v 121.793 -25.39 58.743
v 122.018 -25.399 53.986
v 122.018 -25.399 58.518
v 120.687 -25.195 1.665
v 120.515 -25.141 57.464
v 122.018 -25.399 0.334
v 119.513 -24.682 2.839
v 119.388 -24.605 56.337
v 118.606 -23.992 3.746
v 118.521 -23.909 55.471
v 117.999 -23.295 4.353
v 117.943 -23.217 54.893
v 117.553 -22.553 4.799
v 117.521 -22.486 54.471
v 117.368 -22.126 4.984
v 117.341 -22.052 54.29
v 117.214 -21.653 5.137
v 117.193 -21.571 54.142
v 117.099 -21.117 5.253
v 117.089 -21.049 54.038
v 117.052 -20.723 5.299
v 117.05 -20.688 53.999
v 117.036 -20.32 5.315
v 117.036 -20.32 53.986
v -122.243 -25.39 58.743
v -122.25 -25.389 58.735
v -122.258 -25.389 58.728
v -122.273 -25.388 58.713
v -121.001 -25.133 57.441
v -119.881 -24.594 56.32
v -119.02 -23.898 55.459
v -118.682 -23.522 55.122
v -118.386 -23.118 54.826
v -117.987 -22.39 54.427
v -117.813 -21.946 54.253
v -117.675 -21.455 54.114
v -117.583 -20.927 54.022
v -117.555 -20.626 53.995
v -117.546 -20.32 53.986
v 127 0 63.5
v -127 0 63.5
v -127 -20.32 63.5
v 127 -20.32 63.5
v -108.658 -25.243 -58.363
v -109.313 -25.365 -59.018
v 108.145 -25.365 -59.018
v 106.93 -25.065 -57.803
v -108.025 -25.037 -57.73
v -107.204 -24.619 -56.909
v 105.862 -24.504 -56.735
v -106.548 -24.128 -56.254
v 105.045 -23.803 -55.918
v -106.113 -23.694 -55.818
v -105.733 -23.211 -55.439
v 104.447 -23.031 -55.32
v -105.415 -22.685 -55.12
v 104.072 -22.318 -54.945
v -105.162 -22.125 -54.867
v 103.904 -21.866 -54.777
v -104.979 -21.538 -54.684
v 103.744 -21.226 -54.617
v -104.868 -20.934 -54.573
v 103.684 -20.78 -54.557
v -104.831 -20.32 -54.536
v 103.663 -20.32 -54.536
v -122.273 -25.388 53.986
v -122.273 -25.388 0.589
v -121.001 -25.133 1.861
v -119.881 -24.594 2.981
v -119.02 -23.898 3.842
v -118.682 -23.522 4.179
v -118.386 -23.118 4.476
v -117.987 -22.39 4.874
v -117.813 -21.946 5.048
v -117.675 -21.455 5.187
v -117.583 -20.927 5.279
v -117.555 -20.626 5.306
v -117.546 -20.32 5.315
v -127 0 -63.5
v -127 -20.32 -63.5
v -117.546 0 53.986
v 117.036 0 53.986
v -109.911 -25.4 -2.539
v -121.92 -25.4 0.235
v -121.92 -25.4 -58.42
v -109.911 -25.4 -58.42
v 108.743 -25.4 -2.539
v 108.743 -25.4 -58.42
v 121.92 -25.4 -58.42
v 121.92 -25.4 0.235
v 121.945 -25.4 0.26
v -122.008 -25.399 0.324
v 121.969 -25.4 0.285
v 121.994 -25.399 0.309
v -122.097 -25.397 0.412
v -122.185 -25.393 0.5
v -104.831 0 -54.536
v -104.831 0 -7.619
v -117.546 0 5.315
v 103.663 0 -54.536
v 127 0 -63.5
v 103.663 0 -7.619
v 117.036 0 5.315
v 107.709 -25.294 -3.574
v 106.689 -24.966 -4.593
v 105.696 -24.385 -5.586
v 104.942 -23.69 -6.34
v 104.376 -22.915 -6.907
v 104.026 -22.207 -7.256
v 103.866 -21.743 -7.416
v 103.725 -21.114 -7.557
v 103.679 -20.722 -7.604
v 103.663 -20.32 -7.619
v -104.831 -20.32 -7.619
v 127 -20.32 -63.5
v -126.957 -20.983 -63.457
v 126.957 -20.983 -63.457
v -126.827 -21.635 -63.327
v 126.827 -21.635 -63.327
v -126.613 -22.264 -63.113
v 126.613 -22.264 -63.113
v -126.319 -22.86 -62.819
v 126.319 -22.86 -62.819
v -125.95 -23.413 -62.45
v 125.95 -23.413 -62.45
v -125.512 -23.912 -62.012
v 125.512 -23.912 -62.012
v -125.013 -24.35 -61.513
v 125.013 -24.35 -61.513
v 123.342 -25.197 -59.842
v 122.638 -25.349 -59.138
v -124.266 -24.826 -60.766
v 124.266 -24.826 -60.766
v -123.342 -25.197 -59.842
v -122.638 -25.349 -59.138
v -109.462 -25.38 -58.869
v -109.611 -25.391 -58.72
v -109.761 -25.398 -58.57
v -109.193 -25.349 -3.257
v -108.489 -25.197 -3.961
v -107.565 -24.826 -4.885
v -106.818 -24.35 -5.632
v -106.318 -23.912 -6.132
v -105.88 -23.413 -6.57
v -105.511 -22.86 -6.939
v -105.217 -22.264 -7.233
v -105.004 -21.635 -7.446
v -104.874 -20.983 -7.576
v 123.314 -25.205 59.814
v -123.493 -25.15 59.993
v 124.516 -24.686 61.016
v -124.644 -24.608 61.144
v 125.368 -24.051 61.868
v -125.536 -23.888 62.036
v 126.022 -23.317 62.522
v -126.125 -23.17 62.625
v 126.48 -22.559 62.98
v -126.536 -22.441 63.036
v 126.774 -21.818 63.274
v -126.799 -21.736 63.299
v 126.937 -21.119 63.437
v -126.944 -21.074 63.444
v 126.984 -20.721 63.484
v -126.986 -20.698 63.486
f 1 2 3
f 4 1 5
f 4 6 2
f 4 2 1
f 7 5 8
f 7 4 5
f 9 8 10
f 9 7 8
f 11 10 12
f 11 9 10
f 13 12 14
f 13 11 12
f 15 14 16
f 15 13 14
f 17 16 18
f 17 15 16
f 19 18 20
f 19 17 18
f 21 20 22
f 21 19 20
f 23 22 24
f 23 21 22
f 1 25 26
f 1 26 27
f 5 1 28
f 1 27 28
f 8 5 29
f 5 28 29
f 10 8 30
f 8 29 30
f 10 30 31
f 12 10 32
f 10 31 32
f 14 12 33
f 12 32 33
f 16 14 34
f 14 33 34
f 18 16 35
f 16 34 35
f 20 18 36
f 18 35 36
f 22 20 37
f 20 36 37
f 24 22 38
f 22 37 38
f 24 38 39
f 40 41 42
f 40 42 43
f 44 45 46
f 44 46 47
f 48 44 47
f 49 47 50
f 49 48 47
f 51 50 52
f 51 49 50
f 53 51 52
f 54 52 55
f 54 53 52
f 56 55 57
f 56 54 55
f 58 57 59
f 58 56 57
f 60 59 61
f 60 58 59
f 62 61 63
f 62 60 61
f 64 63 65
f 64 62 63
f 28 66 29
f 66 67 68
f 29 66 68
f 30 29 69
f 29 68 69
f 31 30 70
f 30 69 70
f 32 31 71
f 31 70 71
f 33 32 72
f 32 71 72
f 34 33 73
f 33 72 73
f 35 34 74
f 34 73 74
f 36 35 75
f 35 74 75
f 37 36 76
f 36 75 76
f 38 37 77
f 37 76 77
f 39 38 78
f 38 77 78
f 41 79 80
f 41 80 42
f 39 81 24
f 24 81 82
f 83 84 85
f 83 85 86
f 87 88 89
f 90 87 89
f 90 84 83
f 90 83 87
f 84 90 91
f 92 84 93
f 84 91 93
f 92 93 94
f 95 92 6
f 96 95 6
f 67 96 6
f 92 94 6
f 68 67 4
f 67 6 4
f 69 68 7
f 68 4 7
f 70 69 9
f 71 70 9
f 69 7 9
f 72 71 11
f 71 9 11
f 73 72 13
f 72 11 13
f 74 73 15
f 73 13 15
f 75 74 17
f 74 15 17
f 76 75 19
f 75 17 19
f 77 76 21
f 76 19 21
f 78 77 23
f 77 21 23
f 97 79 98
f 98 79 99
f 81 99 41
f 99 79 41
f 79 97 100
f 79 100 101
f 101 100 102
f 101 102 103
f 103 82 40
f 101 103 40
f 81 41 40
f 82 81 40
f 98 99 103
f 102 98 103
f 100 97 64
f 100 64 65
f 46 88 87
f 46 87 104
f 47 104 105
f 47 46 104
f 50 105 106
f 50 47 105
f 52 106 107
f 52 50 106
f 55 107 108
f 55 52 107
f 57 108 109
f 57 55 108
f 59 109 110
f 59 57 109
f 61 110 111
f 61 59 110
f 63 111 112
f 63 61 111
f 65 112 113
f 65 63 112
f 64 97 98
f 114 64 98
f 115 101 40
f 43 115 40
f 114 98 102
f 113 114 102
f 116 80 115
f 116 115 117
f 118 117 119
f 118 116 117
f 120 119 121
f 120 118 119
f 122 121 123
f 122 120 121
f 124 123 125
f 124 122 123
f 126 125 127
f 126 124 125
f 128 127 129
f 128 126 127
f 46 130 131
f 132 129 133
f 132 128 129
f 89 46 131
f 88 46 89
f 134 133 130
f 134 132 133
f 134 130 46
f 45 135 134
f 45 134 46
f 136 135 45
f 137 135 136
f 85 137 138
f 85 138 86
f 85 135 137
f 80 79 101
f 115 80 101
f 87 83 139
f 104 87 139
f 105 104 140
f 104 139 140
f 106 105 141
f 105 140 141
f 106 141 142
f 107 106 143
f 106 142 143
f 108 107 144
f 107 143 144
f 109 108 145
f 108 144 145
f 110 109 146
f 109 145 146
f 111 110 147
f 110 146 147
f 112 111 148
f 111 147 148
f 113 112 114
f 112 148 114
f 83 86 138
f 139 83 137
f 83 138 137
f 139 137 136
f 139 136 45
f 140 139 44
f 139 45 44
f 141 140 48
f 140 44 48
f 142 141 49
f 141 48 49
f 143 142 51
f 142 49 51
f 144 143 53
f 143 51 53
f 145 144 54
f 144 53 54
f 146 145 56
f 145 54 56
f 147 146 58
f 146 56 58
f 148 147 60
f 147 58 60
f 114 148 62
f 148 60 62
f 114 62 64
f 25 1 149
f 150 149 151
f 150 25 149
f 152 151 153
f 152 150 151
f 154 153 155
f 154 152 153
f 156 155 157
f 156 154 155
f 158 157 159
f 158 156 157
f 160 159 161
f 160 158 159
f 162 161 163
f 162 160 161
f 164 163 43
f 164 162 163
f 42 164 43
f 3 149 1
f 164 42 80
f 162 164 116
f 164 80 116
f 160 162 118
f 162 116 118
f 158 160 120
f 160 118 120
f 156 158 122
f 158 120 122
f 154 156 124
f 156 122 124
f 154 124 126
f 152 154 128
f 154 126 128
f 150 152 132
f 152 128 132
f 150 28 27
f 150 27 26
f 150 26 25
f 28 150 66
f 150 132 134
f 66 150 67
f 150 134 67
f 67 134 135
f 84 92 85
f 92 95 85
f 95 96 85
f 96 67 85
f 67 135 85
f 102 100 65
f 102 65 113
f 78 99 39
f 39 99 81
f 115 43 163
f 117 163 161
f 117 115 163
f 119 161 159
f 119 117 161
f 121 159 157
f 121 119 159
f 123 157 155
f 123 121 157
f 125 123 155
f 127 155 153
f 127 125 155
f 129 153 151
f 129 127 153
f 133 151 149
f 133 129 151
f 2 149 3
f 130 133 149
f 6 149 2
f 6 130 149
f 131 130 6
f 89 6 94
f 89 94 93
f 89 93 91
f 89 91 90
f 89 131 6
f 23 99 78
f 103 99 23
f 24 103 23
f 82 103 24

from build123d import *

# Parameters (mm, degrees)
F0_W         = 254
F0_H         = 127
F2_DEPTH     = 25.4
F1_W         = 234.5826178789
F1_H         = 48.6704111099
F1_W_2       = 208.4935232997
F1_H_2       = 46.9165234827
F3_DEPTH     = 50.8
F4_DEPTH     = 102.87
F5_T1_DEPTH  = 279.4
F5_T3_DEPTH  = 152.4
F5_T5_DEPTH  = 46.9165234827
F5_T7_DEPTH  = 208.4935232997
F5_T9_DEPTH  = 48.6704111099
F5_T11_DEPTH = 234.5826178789
F5_T17_DEPTH = 59.6165234827
F5_T21_DEPTH = 221.1935232997
F5_T28_DEPTH = 59.6165234827
F5_T32_DEPTH = 221.1935232997
F5_T39_DEPTH = 221.1935232997
F5_T43_DEPTH = 59.6165234827
F5_T50_DEPTH = 59.6165234827
F5_T54_DEPTH = 221.1935232997
F5_T61_DEPTH = 61.3704111099
F5_T65_DEPTH = 247.2826178789
F5_T72_DEPTH = 61.3704111099
F5_T76_DEPTH = 247.2826178789
F5_T83_DEPTH = 247.2826178789
F5_T87_DEPTH = 61.3704111099
F5_T94_DEPTH = 61.3704111099
F5_T98_DEPTH = 247.2826178789


# Not quite as in the source:
# - a fillet or chamfer that OpenCascade refuses, or shapes differently, is made with other operations: its cross-section is extruded or revolved along the edge and cut away or added


with BuildPart() as f2:
    # F0 (on Front) → F2 (new body)
    with BuildSketch(Plane.XZ):
        Rectangle(F0_W, F0_H)
    extrude(amount=F2_DEPTH)

    # F1 (on face) → F3 (cut)
    with BuildSketch(Plane.XZ):
        with Locations((-0.2548918128, 29.650695622)):
            Rectangle(F1_W, F1_H)
        with Locations((-0.5837492645, -31.0777008999)):
            Rectangle(F1_W_2, F1_H_2)
    extrude(amount=-F3_DEPTH, mode=Mode.SUBTRACT)

    # F1 (on face) → F4 (cut)
    with BuildSketch(Plane.XZ):
        with Locations((-0.2548918128, 29.650695622)):
            Rectangle(F1_W, F1_H)
        with Locations((-0.5837492645, -31.0777008999)):
            Rectangle(F1_W_2, F1_H_2)
    extrude(amount=F4_DEPTH, mode=Mode.SUBTRACT)

    # F5: fillet of radius 5.08 on 12 edges, made by hand

    # F5_s2 → F5_t1 (cut)
    with BuildSketch(Plane.YZ.offset(-139.7)):
        with BuildLine():
            ThreePointArc((-20.32, -63.5), (-23.9121024484, -62.0121024484), (-25.4, -58.42))
            Line((-25.4, -58.42), (-25.4, -63.5))
            Line((-25.4, -63.5), (-20.32, -63.5))
        make_face()
        with BuildLine():
            ThreePointArc((-25.4, 58.42), (-23.9121024484, 62.0121024484), (-20.32, 63.5))
            Line((-20.32, 63.5), (-25.4, 63.5))
            Line((-25.4, 63.5), (-25.4, 58.42))
        make_face()
    extrude(amount=F5_T1_DEPTH, mode=Mode.SUBTRACT)

    # F5_s4 → F5_t3 (cut)
    with BuildSketch(Plane.XY.offset(-76.2)):
        with BuildLine():
            ThreePointArc((-127, -20.32), (-125.5121024484, -23.9121024484), (-121.92, -25.4))
            Line((-121.92, -25.4), (-127, -25.4))
            Line((-127, -25.4), (-127, -20.32))
        make_face()
        with BuildLine():
            ThreePointArc((127, -20.32), (125.5121024484, -23.9121024484), (121.92, -25.4))
            Line((121.92, -25.4), (127, -25.4))
            Line((127, -25.4), (127, -20.32))
        make_face()
    extrude(amount=F5_T3_DEPTH, mode=Mode.SUBTRACT)

    # F5_s6 → F5_t5 (cut)
    with BuildSketch(Plane.XY.offset(-54.5359626412)):
        with BuildLine():
            ThreePointArc((-109.9105109143, -25.4), (-106.3184084659, -23.9121024484), (-104.8305109143, -20.32))
            Line((-104.8305109143, -20.32), (-104.8305109143, -25.4))
            Line((-104.8305109143, -25.4), (-109.9105109143, -25.4))
        make_face()
        with BuildLine():
            ThreePointArc((108.7430123854, -25.4), (105.1509099369, -23.9121024484), (103.6630123854, -20.32))
            Line((103.6630123854, -20.32), (103.6630123854, -25.4))
            Line((103.6630123854, -25.4), (108.7430123854, -25.4))
        make_face()
    extrude(amount=F5_T5_DEPTH, mode=Mode.SUBTRACT)

    # F5_s8 → F5_t7 (cut)
    with BuildSketch(Plane.YZ.offset(-104.8305109143)):
        with BuildLine():
            ThreePointArc((-25.4, -59.6159626412), (-23.9121024484, -56.0238601928), (-20.32, -54.5359626412))
            Line((-20.32, -54.5359626412), (-25.4, -54.5359626412))
            Line((-25.4, -54.5359626412), (-25.4, -59.6159626412))
        make_face()
        with BuildLine():
            ThreePointArc((-25.4, -2.5394391586), (-23.9121024484, -6.131541607), (-20.32, -7.6194391586))
            Line((-20.32, -7.6194391586), (-25.4, -7.6194391586))
            Line((-25.4, -7.6194391586), (-25.4, -2.5394391586))
        make_face()
    extrude(amount=F5_T7_DEPTH, mode=Mode.SUBTRACT)

    # F5_s10 → F5_t9 (cut)
    with BuildSketch(Plane.XY.offset(5.315490067)):
        with BuildLine():
            ThreePointArc((-122.6262007523, -25.4), (-119.0340983038, -23.9121024484), (-117.5462007523, -20.32))
            Line((-117.5462007523, -20.32), (-117.5462007523, -25.4))
            Line((-117.5462007523, -25.4), (-122.6262007523, -25.4))
        make_face()
        with BuildLine():
            ThreePointArc((122.1164171267, -25.4), (118.5243146782, -23.9121024484), (117.0364171267, -20.32))
            Line((117.0364171267, -20.32), (117.0364171267, -25.4))
            Line((117.0364171267, -25.4), (122.1164171267, -25.4))
        make_face()
    extrude(amount=F5_T9_DEPTH, mode=Mode.SUBTRACT)

    # F5_s12 → F5_t11 (cut)
    with BuildSketch(Plane.YZ.offset(-117.5462007523)):
        with BuildLine():
            ThreePointArc((-25.4, 0.235490067), (-23.9121024484, 3.8275925154), (-20.32, 5.315490067))
            Line((-20.32, 5.315490067), (-25.4, 5.315490067))
            Line((-25.4, 5.315490067), (-25.4, 0.235490067))
        make_face()
        with BuildLine():
            ThreePointArc((-25.4, 59.0659011769), (-23.9121024484, 55.4737987285), (-20.32, 53.9859011769))
            Line((-20.32, 53.9859011769), (-25.4, 53.9859011769))
            Line((-25.4, 53.9859011769), (-25.4, 59.0659011769))
        make_face()
    extrude(amount=F5_T11_DEPTH, mode=Mode.SUBTRACT)


with BuildPart() as f5_tool15:
    # F5_s16 → F5_t17 (new body)
    with BuildSketch(Plane.XY.offset(-67.2359626412)):
        with BuildLine():
            ThreePointArc((-109.9105109143, -25.4), (-106.3184084659, -23.9121024484), (-104.8305109143, -20.32))
            Line((-104.8305109143, -20.32), (-104.8305109143, -25.4))
            Line((-104.8305109143, -25.4), (-109.9105109143, -25.4))
        make_face()
    extrude(amount=F5_T17_DEPTH)

    split(bisect_by=Plane.XY.offset(-54.5359626412), keep=Keep.BOTTOM)


with BuildPart() as f5_tool19:
    # F5_s20 → F5_t21 (new body)
    with BuildSketch(Plane.YZ.offset(103.6630123854)):
        with BuildLine():
            ThreePointArc((-25.4, -59.6159626412), (-23.9121024484, -56.0238601928), (-20.32, -54.5359626412))
            Line((-20.32, -54.5359626412), (-25.4, -54.5359626412))
            Line((-25.4, -54.5359626412), (-25.4, -59.6159626412))
        make_face()
    extrude(amount=-F5_T21_DEPTH)

    split(bisect_by=Plane.YZ.offset(-104.8305109143), keep=Keep.BOTTOM)


with BuildPart() as f5_tool15_1:
    add(f5_tool15.part)

    # F5_t23: intersect F5_tool19
    add(f5_tool19.part, mode=Mode.INTERSECT)


with BuildPart() as f2_1:
    add(f2.part)

    # F5_t13: cut F5_tool15
    add(f5_tool15_1.part, mode=Mode.SUBTRACT)


with BuildPart() as f5_tool26:
    # F5_s27 → F5_t28 (new body)
    with BuildSketch(Plane.XY.offset(-54.5359626412)):
        with BuildLine():
            ThreePointArc((-109.9105109143, -25.4), (-106.3184084659, -23.9121024484), (-104.8305109143, -20.32))
            Line((-104.8305109143, -20.32), (-104.8305109143, -25.4))
            Line((-104.8305109143, -25.4), (-109.9105109143, -25.4))
        make_face()
    extrude(amount=F5_T28_DEPTH)

    split(bisect_by=Plane.XY.offset(-7.6194391586), keep=Keep.TOP)


with BuildPart() as f5_tool30:
    # F5_s31 → F5_t32 (new body)
    with BuildSketch(Plane.YZ.offset(-117.5305109143)):
        with BuildLine():
            ThreePointArc((-25.4, -2.5394391586), (-23.9121024484, -6.131541607), (-20.32, -7.6194391586))
            Line((-20.32, -7.6194391586), (-25.4, -7.6194391586))
            Line((-25.4, -7.6194391586), (-25.4, -2.5394391586))
        make_face()
    extrude(amount=F5_T32_DEPTH)

    split(bisect_by=Plane.YZ.offset(-104.8305109143), keep=Keep.BOTTOM)


with BuildPart() as f5_tool26_1:
    add(f5_tool26.part)

    # F5_t34: intersect F5_tool30
    add(f5_tool30.part, mode=Mode.INTERSECT)


with BuildPart() as f2_2:
    add(f2_1.part)

    # F5_t24: cut F5_tool26
    add(f5_tool26_1.part, mode=Mode.SUBTRACT)


with BuildPart() as f5_tool37:
    # F5_s38 → F5_t39 (new body)
    with BuildSketch(Plane.YZ.offset(116.3630123854)):
        with BuildLine():
            ThreePointArc((-25.4, -59.6159626412), (-23.9121024484, -56.0238601928), (-20.32, -54.5359626412))
            Line((-20.32, -54.5359626412), (-25.4, -54.5359626412))
            Line((-25.4, -54.5359626412), (-25.4, -59.6159626412))
        make_face()
    extrude(amount=-F5_T39_DEPTH)

    split(bisect_by=Plane.YZ.offset(103.6630123854), keep=Keep.TOP)


with BuildPart() as f5_tool41:
    # F5_s42 → F5_t43 (new body)
    with BuildSketch(Plane.XY.offset(-7.6194391586)):
        with BuildLine():
            ThreePointArc((108.7430123854, -25.4), (105.1509099369, -23.9121024484), (103.6630123854, -20.32))
            Line((103.6630123854, -20.32), (103.6630123854, -25.4))
            Line((103.6630123854, -25.4), (108.7430123854, -25.4))
        make_face()
    extrude(amount=-F5_T43_DEPTH)

    split(bisect_by=Plane.XY.offset(-54.5359626412), keep=Keep.BOTTOM)


with BuildPart() as f5_tool37_1:
    add(f5_tool37.part)

    # F5_t45: intersect F5_tool41
    add(f5_tool41.part, mode=Mode.INTERSECT)


with BuildPart() as f2_3:
    add(f2_2.part)

    # F5_t35: cut F5_tool37
    add(f5_tool37_1.part, mode=Mode.SUBTRACT)


with BuildPart() as f5_tool48:
    # F5_s49 → F5_t50 (new body)
    with BuildSketch(Plane.XY.offset(5.0805608414)):
        with BuildLine():
            ThreePointArc((108.7430123854, -25.4), (105.1509099369, -23.9121024484), (103.6630123854, -20.32))
            Line((103.6630123854, -20.32), (103.6630123854, -25.4))
            Line((103.6630123854, -25.4), (108.7430123854, -25.4))
        make_face()
    extrude(amount=-F5_T50_DEPTH)

    split(bisect_by=Plane.XY.offset(-7.6194391586), keep=Keep.TOP)


with BuildPart() as f5_tool52:
    # F5_s53 → F5_t54 (new body)
    with BuildSketch(Plane.YZ.offset(-104.8305109143)):
        with BuildLine():
            ThreePointArc((-25.4, -2.5394391586), (-23.9121024484, -6.131541607), (-20.32, -7.6194391586))
            Line((-20.32, -7.6194391586), (-25.4, -7.6194391586))
            Line((-25.4, -7.6194391586), (-25.4, -2.5394391586))
        make_face()
    extrude(amount=F5_T54_DEPTH)

    split(bisect_by=Plane.YZ.offset(103.6630123854), keep=Keep.TOP)


with BuildPart() as f5_tool48_1:
    add(f5_tool48.part)

    # F5_t56: intersect F5_tool52
    add(f5_tool52.part, mode=Mode.INTERSECT)


with BuildPart() as f2_4:
    add(f2_3.part)

    # F5_t46: cut F5_tool48
    add(f5_tool48_1.part, mode=Mode.SUBTRACT)


with BuildPart() as f5_tool59:
    # F5_s60 → F5_t61 (new body)
    with BuildSketch(Plane.XY.offset(-7.384509933)):
        with BuildLine():
            ThreePointArc((-122.6262007523, -25.4), (-119.0340983038, -23.9121024484), (-117.5462007523, -20.32))
            Line((-117.5462007523, -20.32), (-117.5462007523, -25.4))
            Line((-117.5462007523, -25.4), (-122.6262007523, -25.4))
        make_face()
    extrude(amount=F5_T61_DEPTH)

    split(bisect_by=Plane.XY.offset(5.315490067), keep=Keep.BOTTOM)


with BuildPart() as f5_tool63:
    # F5_s64 → F5_t65 (new body)
    with BuildSketch(Plane.YZ.offset(117.0364171267)):
        with BuildLine():
            ThreePointArc((-25.4, 0.235490067), (-23.9121024484, 3.8275925154), (-20.32, 5.315490067))
            Line((-20.32, 5.315490067), (-25.4, 5.315490067))
            Line((-25.4, 5.315490067), (-25.4, 0.235490067))
        make_face()
    extrude(amount=-F5_T65_DEPTH)

    split(bisect_by=Plane.YZ.offset(-117.5462007523), keep=Keep.BOTTOM)


with BuildPart() as f5_tool59_1:
    add(f5_tool59.part)

    # F5_t67: intersect F5_tool63
    add(f5_tool63.part, mode=Mode.INTERSECT)


with BuildPart() as f2_5:
    add(f2_4.part)

    # F5_t57: cut F5_tool59
    add(f5_tool59_1.part, mode=Mode.SUBTRACT)


with BuildPart() as f5_tool70:
    # F5_s71 → F5_t72 (new body)
    with BuildSketch(Plane.XY.offset(5.315490067)):
        with BuildLine():
            ThreePointArc((-122.6262007523, -25.4), (-119.0340983038, -23.9121024484), (-117.5462007523, -20.32))
            Line((-117.5462007523, -20.32), (-117.5462007523, -25.4))
            Line((-117.5462007523, -25.4), (-122.6262007523, -25.4))
        make_face()
    extrude(amount=F5_T72_DEPTH)

    split(bisect_by=Plane.XY.offset(53.9859011769), keep=Keep.TOP)


with BuildPart() as f5_tool74:
    # F5_s75 → F5_t76 (new body)
    with BuildSketch(Plane.YZ.offset(-130.2462007523)):
        with BuildLine():
            ThreePointArc((-25.4, 59.0659011769), (-23.9121024484, 55.4737987285), (-20.32, 53.9859011769))
            Line((-20.32, 53.9859011769), (-25.4, 53.9859011769))
            Line((-25.4, 53.9859011769), (-25.4, 59.0659011769))
        make_face()
    extrude(amount=F5_T76_DEPTH)

    split(bisect_by=Plane.YZ.offset(-117.5462007523), keep=Keep.BOTTOM)


with BuildPart() as f5_tool70_1:
    add(f5_tool70.part)

    # F5_t78: intersect F5_tool74
    add(f5_tool74.part, mode=Mode.INTERSECT)


with BuildPart() as f2_6:
    add(f2_5.part)

    # F5_t68: cut F5_tool70
    add(f5_tool70_1.part, mode=Mode.SUBTRACT)


with BuildPart() as f5_tool81:
    # F5_s82 → F5_t83 (new body)
    with BuildSketch(Plane.YZ.offset(129.7364171267)):
        with BuildLine():
            ThreePointArc((-25.4, 0.235490067), (-23.9121024484, 3.8275925154), (-20.32, 5.315490067))
            Line((-20.32, 5.315490067), (-25.4, 5.315490067))
            Line((-25.4, 5.315490067), (-25.4, 0.235490067))
        make_face()
    extrude(amount=-F5_T83_DEPTH)

    split(bisect_by=Plane.YZ.offset(117.0364171267), keep=Keep.TOP)


with BuildPart() as f5_tool85:
    # F5_s86 → F5_t87 (new body)
    with BuildSketch(Plane.XY.offset(53.9859011769)):
        with BuildLine():
            ThreePointArc((122.1164171267, -25.4), (118.5243146782, -23.9121024484), (117.0364171267, -20.32))
            Line((117.0364171267, -20.32), (117.0364171267, -25.4))
            Line((117.0364171267, -25.4), (122.1164171267, -25.4))
        make_face()
    extrude(amount=-F5_T87_DEPTH)

    split(bisect_by=Plane.XY.offset(5.315490067), keep=Keep.BOTTOM)


with BuildPart() as f5_tool81_1:
    add(f5_tool81.part)

    # F5_t89: intersect F5_tool85
    add(f5_tool85.part, mode=Mode.INTERSECT)


with BuildPart() as f2_7:
    add(f2_6.part)

    # F5_t79: cut F5_tool81
    add(f5_tool81_1.part, mode=Mode.SUBTRACT)


with BuildPart() as f5_tool92:
    # F5_s93 → F5_t94 (new body)
    with BuildSketch(Plane.XY.offset(66.6859011769)):
        with BuildLine():
            ThreePointArc((122.1164171267, -25.4), (118.5243146782, -23.9121024484), (117.0364171267, -20.32))
            Line((117.0364171267, -20.32), (117.0364171267, -25.4))
            Line((117.0364171267, -25.4), (122.1164171267, -25.4))
        make_face()
    extrude(amount=-F5_T94_DEPTH)

    split(bisect_by=Plane.XY.offset(53.9859011769), keep=Keep.TOP)


with BuildPart() as f5_tool96:
    # F5_s97 → F5_t98 (new body)
    with BuildSketch(Plane.YZ.offset(-117.5462007523)):
        with BuildLine():
            ThreePointArc((-25.4, 59.0659011769), (-23.9121024484, 55.4737987285), (-20.32, 53.9859011769))
            Line((-20.32, 53.9859011769), (-25.4, 53.9859011769))
            Line((-25.4, 53.9859011769), (-25.4, 59.0659011769))
        make_face()
    extrude(amount=F5_T98_DEPTH)

    split(bisect_by=Plane.YZ.offset(117.0364171267), keep=Keep.TOP)


with BuildPart() as f5_tool92_1:
    add(f5_tool92.part)

    # F5_t100: intersect F5_tool96
    add(f5_tool96.part, mode=Mode.INTERSECT)


with BuildPart() as f2_8:
    add(f2_7.part)

    # F5_t90: cut F5_tool92
    add(f5_tool92_1.part, mode=Mode.SUBTRACT)


solid = f2_8.part
